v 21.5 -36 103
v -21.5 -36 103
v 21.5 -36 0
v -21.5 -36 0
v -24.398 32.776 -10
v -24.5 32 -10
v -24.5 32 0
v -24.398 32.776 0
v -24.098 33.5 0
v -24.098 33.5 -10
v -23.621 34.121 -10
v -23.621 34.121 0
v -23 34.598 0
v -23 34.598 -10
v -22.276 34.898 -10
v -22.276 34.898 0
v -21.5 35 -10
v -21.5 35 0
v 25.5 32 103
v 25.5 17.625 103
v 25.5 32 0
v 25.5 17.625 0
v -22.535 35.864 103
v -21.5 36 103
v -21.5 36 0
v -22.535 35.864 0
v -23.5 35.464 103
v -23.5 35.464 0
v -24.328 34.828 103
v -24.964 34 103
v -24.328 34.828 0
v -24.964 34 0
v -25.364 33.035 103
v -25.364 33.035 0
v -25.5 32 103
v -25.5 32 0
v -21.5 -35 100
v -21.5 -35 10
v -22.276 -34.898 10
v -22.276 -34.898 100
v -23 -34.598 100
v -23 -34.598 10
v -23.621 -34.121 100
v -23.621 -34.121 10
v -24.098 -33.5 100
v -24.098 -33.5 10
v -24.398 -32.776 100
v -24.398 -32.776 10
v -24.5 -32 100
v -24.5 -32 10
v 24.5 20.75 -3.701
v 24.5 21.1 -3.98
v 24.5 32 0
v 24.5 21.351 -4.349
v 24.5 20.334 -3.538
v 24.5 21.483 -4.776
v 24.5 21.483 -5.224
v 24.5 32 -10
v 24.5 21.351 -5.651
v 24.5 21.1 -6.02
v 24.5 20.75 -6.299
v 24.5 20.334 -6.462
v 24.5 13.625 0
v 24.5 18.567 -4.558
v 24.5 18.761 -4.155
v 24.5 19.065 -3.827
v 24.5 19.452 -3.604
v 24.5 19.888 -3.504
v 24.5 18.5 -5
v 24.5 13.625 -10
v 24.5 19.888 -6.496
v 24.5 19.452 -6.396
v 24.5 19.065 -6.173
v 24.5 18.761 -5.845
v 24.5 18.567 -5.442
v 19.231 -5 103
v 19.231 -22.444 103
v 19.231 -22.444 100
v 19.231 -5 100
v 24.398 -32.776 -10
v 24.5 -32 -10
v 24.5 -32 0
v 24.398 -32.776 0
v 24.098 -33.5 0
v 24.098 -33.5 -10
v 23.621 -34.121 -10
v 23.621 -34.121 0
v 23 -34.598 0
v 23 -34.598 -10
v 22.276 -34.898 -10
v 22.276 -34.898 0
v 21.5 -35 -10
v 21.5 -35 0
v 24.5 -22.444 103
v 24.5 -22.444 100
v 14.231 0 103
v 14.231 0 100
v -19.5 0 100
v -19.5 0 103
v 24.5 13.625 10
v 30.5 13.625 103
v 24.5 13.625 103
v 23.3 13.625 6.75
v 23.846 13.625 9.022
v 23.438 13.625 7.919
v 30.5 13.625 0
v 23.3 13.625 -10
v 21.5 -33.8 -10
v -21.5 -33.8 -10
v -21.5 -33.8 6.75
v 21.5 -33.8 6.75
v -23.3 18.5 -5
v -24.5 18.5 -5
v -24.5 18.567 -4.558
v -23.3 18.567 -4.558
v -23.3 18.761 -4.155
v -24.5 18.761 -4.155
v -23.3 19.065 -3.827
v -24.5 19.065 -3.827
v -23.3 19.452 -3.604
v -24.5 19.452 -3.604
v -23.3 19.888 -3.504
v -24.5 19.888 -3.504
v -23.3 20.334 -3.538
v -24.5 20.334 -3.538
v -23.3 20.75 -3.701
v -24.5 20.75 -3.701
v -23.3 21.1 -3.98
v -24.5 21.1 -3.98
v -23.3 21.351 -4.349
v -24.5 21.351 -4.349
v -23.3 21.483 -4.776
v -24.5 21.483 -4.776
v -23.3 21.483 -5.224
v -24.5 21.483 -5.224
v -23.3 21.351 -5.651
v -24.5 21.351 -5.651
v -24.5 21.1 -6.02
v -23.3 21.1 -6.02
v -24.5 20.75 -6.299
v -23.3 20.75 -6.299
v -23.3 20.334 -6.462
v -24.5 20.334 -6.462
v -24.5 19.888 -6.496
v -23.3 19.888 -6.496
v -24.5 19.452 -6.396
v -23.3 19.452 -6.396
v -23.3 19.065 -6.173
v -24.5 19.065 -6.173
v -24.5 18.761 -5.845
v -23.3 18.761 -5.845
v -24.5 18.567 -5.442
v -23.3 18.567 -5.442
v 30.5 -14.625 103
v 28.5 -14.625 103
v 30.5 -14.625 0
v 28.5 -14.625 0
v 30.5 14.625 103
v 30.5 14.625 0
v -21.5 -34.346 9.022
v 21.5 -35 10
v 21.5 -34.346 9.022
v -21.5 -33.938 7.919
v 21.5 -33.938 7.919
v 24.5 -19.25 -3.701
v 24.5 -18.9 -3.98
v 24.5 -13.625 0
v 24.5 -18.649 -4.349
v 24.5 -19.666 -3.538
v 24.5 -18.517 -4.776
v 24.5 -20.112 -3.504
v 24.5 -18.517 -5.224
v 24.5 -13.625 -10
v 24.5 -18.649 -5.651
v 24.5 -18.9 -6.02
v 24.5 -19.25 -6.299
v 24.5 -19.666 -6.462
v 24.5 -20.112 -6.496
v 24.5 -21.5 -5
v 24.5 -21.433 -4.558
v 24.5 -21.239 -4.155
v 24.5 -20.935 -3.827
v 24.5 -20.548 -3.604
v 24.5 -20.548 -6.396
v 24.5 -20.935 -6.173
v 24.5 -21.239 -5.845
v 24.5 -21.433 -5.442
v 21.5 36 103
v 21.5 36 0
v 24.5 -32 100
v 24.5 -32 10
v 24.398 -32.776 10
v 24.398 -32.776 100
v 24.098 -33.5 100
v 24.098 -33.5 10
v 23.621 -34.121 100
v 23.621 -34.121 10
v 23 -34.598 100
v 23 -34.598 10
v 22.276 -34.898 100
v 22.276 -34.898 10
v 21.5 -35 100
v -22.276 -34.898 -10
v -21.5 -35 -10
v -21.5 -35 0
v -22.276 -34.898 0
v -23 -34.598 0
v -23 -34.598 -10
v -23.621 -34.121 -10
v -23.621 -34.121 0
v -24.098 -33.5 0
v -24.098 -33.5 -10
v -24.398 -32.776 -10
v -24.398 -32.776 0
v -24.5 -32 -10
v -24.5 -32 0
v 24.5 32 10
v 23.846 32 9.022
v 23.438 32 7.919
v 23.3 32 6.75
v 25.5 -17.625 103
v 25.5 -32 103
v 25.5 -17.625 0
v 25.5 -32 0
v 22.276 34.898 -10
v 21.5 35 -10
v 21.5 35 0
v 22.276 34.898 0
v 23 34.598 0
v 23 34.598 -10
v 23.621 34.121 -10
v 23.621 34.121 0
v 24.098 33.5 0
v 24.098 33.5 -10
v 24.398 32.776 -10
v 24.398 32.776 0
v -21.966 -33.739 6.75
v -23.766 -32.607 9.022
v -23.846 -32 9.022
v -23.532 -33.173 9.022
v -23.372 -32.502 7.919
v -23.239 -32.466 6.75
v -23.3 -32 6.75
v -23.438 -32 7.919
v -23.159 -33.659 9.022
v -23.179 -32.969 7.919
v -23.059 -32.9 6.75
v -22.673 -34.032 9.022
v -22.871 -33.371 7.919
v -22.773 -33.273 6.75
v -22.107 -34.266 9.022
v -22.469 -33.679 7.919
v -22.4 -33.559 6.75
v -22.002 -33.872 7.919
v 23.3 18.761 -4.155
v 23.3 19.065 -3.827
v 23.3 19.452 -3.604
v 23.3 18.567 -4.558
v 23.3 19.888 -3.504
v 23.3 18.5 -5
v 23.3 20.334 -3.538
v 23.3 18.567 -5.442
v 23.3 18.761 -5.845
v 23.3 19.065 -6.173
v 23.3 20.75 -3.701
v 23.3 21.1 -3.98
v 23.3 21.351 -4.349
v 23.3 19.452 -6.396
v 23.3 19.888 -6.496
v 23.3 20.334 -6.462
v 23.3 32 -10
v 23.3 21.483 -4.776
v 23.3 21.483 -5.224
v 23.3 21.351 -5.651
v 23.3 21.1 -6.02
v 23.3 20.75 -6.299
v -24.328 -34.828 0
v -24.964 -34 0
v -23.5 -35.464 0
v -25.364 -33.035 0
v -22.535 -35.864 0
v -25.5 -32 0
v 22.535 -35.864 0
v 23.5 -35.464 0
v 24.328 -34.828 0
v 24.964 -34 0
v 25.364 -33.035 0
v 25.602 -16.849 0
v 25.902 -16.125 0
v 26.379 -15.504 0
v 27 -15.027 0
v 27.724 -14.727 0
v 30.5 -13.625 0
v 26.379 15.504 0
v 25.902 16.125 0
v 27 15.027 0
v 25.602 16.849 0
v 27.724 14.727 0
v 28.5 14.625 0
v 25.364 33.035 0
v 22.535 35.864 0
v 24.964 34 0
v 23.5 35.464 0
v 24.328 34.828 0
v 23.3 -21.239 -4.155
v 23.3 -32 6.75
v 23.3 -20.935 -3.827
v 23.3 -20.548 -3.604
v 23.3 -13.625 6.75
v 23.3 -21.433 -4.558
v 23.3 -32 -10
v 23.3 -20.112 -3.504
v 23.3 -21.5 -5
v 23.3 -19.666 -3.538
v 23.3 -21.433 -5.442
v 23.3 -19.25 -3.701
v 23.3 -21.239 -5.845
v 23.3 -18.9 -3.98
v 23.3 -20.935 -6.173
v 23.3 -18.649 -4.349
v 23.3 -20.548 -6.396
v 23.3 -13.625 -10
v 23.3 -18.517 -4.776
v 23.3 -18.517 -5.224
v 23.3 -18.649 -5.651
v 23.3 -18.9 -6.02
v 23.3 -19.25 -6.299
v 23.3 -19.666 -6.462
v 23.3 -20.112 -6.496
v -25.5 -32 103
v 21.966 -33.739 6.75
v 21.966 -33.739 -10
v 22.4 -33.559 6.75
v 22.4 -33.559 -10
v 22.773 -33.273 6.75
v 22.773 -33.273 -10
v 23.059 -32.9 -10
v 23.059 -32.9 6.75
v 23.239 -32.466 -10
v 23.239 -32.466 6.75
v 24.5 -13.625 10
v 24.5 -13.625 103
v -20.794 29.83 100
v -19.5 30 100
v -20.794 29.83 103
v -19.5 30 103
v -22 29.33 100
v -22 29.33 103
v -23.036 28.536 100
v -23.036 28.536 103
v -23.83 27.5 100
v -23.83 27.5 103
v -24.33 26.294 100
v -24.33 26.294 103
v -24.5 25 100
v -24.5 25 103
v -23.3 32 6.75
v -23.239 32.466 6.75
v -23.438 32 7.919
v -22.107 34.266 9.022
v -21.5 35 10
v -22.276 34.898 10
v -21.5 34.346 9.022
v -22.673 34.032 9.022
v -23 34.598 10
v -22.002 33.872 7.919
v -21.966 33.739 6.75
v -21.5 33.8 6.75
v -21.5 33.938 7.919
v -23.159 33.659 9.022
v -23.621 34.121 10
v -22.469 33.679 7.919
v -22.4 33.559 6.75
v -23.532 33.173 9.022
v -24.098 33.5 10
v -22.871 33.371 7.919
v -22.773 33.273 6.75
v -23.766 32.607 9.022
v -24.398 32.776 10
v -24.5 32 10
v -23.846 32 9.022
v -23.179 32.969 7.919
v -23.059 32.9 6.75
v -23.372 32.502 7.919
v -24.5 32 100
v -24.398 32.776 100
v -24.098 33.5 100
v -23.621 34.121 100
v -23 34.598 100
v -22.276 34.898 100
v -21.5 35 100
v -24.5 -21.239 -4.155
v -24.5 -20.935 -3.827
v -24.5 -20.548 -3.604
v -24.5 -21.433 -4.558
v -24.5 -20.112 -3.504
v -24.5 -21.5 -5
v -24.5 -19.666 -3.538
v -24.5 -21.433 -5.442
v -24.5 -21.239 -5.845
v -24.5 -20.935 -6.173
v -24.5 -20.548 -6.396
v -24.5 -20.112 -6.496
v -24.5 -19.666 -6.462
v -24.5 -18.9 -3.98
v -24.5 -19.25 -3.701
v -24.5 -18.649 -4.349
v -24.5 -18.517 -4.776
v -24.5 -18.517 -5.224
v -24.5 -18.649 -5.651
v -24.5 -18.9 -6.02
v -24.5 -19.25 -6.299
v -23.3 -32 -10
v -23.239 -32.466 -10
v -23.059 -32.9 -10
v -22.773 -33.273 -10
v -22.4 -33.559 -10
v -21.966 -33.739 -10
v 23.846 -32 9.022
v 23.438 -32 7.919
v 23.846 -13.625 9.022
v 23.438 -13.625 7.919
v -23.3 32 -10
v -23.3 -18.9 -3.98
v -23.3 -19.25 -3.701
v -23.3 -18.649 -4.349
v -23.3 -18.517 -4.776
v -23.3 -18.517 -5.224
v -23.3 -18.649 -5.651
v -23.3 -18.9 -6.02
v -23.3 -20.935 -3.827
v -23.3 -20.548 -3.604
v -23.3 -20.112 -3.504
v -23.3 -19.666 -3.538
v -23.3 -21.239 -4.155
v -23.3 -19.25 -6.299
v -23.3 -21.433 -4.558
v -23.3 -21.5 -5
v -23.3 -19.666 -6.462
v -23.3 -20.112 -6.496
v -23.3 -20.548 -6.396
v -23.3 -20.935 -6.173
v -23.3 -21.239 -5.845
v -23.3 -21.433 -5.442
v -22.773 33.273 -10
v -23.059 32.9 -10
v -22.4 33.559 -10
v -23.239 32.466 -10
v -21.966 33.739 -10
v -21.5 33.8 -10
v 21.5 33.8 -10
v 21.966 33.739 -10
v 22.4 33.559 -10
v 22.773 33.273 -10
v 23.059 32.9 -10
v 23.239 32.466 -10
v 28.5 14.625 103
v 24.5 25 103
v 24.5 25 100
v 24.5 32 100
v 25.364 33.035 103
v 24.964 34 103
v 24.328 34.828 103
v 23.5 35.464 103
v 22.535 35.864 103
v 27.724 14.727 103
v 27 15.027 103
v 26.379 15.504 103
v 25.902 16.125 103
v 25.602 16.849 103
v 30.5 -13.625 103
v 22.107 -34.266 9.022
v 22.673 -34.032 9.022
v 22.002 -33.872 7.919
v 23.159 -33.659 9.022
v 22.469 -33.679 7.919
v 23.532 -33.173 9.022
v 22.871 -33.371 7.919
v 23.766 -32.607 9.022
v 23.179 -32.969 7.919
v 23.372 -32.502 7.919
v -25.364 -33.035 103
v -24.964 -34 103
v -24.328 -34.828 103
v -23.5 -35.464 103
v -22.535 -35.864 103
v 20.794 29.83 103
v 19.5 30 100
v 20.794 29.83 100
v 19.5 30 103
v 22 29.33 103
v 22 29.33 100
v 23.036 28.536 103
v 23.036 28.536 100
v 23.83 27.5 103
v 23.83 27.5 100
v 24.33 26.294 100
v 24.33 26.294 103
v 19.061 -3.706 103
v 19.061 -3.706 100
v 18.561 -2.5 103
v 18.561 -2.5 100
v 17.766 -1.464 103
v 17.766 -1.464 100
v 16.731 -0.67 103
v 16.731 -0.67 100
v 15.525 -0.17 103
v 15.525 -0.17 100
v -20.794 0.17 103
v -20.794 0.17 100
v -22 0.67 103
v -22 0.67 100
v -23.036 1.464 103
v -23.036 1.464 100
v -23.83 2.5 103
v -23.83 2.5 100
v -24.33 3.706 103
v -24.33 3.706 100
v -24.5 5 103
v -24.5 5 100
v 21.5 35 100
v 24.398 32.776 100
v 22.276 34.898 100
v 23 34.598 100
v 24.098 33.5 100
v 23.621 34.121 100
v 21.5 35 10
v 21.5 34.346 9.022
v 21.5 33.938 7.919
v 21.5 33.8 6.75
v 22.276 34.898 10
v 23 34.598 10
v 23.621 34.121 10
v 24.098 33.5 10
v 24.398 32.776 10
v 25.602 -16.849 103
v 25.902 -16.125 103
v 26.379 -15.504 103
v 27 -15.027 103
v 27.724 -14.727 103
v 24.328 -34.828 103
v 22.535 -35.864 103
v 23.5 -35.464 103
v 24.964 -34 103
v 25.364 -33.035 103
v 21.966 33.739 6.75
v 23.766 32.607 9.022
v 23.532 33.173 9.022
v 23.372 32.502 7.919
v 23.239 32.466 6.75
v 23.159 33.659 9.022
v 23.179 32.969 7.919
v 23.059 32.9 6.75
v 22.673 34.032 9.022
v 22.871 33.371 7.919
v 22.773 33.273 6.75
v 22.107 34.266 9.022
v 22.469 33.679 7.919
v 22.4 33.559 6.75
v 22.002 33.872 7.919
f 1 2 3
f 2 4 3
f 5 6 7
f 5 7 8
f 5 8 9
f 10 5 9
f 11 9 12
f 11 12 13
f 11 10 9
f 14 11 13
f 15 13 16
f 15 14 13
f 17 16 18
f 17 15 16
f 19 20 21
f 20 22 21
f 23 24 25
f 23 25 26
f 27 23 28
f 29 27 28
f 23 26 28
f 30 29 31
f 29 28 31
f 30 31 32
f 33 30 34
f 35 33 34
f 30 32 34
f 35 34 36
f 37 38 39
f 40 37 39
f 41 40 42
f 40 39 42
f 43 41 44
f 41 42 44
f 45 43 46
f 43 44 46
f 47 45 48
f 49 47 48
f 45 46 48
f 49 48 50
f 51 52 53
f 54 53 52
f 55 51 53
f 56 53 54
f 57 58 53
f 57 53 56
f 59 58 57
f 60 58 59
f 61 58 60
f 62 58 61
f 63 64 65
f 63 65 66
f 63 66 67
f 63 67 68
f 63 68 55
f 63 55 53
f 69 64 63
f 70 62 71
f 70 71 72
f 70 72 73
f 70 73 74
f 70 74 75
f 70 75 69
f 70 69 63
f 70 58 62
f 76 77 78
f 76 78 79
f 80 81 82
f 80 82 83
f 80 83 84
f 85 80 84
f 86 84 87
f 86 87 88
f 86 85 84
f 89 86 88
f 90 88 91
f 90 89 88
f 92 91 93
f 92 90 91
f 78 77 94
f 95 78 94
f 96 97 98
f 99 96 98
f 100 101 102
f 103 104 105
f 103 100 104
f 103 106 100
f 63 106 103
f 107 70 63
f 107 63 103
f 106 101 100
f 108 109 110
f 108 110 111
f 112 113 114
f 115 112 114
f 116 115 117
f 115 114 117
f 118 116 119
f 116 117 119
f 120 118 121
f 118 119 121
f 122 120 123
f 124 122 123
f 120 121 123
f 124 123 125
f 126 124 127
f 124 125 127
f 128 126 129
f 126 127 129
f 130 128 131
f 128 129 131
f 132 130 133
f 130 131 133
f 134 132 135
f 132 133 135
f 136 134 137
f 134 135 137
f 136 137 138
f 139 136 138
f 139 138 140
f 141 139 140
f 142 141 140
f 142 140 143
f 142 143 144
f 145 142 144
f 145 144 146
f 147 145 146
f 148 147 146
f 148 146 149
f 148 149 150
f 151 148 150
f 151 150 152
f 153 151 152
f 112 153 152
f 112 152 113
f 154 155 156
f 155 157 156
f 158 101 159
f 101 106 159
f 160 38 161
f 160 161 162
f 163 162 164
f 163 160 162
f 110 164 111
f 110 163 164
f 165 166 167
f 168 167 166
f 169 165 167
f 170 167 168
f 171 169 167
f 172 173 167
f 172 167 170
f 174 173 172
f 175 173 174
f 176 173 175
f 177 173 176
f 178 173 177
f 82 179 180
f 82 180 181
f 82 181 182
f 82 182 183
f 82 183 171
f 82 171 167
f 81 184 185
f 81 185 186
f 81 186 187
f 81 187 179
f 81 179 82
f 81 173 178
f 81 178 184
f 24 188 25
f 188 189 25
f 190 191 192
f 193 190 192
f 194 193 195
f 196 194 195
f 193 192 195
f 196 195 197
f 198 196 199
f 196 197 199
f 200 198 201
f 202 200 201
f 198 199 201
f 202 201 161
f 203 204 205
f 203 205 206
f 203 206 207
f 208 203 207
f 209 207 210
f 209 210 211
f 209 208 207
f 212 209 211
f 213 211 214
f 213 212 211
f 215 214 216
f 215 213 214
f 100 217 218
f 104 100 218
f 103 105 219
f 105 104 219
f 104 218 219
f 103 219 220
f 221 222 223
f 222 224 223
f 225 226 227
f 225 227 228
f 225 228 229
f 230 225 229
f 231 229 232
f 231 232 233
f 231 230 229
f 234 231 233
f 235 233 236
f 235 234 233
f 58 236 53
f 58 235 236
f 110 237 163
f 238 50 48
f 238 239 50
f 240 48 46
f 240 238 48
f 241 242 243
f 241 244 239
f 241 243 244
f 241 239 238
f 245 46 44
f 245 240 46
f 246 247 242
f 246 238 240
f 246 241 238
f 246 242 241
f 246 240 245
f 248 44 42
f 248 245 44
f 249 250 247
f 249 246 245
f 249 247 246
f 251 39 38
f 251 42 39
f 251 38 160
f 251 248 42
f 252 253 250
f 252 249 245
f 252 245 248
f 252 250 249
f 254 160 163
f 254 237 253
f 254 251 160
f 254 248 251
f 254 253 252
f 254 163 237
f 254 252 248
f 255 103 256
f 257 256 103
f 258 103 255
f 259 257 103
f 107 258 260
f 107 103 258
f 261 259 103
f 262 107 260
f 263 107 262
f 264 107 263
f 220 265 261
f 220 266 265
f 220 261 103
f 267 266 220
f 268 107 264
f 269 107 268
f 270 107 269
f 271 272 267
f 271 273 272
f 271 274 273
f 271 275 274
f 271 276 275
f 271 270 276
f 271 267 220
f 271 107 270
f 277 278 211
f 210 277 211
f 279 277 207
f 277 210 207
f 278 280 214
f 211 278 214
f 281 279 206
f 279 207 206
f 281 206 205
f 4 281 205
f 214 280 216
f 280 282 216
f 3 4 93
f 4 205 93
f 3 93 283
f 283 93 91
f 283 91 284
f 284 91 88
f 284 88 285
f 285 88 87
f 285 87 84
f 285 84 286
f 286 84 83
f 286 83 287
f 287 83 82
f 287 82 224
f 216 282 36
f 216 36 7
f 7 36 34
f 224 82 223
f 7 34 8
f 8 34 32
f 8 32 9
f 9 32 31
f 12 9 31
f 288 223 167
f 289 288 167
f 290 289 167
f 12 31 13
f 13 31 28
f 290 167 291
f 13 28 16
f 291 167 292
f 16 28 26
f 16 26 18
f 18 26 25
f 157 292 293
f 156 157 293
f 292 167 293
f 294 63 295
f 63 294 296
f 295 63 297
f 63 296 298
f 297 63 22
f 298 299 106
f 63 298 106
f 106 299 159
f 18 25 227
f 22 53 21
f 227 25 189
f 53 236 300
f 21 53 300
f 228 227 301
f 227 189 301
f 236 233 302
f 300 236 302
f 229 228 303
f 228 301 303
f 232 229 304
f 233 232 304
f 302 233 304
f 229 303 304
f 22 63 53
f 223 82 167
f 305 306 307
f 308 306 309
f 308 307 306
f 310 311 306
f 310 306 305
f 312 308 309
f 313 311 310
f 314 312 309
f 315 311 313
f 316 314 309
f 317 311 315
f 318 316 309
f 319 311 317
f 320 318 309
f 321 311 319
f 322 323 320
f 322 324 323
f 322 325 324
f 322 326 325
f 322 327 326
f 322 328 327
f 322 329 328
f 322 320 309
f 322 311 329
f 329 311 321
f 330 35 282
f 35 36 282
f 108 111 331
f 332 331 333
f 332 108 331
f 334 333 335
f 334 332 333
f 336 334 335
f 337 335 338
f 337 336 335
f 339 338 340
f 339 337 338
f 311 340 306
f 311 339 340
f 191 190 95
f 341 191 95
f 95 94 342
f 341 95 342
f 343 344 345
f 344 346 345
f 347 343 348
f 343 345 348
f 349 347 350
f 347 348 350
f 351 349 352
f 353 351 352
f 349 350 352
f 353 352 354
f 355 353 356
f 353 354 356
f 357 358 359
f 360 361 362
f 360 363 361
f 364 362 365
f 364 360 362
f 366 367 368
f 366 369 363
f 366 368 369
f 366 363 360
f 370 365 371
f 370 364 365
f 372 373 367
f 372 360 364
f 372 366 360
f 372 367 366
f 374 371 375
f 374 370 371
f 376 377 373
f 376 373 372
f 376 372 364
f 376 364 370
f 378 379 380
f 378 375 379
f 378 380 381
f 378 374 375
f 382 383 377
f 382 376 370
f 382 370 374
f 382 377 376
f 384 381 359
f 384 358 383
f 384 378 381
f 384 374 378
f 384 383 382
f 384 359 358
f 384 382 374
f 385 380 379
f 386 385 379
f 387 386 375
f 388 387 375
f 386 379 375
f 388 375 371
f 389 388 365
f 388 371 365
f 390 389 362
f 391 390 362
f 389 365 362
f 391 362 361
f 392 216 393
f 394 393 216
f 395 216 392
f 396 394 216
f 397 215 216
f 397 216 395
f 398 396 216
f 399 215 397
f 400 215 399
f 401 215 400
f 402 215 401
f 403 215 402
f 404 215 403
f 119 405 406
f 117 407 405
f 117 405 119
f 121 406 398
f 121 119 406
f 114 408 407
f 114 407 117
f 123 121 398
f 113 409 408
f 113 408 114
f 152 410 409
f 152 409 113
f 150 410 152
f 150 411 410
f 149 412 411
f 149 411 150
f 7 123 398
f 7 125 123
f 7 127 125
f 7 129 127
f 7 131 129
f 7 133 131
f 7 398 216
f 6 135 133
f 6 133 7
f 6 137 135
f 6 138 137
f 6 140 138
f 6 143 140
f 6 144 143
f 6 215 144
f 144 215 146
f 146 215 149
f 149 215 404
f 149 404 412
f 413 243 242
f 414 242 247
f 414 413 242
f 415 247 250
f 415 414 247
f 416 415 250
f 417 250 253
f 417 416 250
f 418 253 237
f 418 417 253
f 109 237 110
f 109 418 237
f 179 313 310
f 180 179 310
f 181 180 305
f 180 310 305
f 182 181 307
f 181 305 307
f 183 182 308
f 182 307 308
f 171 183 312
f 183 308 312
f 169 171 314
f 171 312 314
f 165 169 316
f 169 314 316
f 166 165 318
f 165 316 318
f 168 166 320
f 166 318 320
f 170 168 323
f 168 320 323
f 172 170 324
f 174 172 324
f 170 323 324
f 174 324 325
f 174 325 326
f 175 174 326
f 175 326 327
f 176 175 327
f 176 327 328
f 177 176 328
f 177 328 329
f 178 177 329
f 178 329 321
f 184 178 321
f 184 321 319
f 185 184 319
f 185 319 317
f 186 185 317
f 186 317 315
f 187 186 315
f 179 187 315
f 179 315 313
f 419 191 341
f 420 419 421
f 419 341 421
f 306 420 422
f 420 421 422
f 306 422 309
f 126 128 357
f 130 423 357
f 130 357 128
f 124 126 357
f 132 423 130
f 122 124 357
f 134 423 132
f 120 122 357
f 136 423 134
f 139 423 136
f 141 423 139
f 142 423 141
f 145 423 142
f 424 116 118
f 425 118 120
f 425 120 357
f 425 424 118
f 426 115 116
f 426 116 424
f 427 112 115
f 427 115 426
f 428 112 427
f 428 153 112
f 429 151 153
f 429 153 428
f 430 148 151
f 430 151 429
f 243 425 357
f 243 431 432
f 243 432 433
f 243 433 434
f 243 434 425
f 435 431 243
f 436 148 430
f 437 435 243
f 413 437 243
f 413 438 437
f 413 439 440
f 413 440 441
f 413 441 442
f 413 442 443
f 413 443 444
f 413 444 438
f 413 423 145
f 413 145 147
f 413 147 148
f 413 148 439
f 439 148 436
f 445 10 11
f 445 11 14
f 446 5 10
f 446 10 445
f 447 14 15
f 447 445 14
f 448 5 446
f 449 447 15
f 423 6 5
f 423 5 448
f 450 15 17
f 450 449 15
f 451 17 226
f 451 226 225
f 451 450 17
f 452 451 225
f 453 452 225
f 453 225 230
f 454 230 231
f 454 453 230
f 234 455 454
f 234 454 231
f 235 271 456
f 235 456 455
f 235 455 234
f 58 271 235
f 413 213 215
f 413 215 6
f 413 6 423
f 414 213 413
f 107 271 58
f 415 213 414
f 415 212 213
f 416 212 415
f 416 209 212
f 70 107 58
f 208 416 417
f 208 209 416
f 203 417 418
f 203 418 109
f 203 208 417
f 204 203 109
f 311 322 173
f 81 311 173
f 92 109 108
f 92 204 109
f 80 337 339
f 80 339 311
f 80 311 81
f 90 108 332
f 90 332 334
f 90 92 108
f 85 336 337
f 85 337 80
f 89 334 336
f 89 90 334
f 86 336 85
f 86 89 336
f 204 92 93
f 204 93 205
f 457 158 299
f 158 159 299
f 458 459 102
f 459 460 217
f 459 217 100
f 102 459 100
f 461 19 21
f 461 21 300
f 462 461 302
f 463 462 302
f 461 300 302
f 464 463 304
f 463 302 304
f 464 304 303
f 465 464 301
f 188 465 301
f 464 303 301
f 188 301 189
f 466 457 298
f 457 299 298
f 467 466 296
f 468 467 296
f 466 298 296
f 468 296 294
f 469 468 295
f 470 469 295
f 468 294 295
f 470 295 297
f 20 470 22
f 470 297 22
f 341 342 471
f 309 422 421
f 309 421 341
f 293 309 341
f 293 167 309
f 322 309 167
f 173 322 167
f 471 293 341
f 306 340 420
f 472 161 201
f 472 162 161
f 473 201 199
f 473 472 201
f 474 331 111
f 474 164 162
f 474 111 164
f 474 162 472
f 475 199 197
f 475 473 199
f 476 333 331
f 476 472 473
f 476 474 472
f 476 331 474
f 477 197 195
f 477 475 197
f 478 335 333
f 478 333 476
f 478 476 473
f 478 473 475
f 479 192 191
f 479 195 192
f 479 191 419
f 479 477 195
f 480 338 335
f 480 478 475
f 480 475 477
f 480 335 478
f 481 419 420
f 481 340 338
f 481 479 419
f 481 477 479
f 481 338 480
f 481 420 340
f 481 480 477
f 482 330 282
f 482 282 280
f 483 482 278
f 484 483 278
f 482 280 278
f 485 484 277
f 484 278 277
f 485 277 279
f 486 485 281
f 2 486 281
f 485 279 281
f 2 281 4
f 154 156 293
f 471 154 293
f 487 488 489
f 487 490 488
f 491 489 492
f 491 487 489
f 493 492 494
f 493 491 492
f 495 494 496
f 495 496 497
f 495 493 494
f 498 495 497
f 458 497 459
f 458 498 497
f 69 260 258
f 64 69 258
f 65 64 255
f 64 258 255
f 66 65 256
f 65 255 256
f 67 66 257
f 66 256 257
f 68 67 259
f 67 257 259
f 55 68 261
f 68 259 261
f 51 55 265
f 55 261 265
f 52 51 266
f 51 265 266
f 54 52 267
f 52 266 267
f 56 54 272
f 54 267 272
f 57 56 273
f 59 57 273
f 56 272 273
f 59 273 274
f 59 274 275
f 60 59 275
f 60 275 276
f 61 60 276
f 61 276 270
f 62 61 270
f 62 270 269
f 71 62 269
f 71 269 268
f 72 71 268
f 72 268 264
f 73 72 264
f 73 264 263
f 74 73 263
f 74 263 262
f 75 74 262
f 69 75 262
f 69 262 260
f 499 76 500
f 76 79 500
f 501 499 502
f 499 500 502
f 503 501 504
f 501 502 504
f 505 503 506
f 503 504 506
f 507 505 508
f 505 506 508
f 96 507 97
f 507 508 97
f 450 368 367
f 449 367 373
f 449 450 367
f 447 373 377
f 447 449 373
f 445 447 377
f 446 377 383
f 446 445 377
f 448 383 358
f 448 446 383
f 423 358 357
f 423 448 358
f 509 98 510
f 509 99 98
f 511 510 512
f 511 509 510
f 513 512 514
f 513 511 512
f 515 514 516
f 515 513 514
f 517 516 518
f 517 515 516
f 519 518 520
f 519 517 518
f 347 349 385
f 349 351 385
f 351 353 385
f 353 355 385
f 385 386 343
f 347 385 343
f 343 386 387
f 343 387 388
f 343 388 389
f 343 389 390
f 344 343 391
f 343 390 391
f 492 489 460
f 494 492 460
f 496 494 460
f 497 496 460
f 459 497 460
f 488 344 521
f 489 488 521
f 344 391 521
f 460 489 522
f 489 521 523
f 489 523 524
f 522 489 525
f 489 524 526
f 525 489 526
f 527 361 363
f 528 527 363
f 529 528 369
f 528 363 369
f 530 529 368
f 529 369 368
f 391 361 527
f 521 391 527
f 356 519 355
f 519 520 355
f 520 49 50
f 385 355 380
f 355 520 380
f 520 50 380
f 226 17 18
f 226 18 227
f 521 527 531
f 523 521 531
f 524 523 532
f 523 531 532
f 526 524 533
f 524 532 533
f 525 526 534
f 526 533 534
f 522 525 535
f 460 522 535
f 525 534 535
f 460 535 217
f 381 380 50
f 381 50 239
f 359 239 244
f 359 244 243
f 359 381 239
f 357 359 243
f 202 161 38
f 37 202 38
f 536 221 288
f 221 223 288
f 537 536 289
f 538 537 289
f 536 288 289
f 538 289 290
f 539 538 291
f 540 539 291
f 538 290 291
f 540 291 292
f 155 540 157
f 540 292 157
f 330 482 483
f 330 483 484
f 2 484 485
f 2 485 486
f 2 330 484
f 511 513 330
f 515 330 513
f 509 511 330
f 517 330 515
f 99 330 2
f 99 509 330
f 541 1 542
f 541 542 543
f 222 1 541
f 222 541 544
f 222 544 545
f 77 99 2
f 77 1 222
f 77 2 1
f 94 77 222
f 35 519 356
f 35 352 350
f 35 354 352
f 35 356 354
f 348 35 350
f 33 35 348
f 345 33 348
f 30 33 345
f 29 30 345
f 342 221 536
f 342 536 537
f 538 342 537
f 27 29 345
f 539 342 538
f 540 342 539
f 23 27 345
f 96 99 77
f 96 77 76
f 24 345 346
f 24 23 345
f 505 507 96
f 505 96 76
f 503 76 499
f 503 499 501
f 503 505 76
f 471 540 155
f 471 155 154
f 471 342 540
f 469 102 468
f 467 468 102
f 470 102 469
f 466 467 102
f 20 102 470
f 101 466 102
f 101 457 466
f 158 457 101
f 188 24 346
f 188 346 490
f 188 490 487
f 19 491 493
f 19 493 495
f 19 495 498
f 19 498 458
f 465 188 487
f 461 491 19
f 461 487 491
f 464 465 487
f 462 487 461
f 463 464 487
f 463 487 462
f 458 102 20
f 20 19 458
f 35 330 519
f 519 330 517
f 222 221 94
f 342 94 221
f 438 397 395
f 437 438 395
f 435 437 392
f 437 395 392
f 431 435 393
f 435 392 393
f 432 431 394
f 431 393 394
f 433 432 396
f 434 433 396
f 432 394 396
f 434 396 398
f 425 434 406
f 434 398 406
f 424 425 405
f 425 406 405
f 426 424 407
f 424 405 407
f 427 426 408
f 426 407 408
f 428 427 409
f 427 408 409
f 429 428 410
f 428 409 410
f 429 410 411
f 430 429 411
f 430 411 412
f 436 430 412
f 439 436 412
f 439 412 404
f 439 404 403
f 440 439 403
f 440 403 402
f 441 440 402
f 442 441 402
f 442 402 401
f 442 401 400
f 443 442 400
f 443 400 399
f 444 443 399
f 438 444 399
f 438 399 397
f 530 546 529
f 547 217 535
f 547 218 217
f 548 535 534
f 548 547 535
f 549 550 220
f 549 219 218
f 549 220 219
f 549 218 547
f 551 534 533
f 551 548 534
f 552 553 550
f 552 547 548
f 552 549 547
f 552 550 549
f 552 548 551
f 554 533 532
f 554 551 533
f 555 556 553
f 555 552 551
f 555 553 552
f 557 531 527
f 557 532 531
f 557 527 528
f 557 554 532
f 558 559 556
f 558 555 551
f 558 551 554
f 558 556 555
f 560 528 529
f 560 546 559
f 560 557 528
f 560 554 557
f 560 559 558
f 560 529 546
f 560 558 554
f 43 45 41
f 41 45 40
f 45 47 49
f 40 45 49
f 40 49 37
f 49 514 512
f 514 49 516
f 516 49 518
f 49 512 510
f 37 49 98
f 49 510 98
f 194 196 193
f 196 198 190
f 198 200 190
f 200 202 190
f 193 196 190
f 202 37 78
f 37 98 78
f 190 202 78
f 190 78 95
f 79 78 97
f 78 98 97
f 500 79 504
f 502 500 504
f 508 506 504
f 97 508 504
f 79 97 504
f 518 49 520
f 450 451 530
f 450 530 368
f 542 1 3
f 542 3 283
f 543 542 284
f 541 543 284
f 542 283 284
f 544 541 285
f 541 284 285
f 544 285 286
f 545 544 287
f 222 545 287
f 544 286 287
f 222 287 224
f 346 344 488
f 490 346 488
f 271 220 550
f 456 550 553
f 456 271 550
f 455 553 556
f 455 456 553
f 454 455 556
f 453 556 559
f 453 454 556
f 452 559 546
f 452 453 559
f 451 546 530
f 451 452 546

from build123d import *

# Parameters (mm, degrees)
F1_DEPTH     = 100
F3_DEPTH     = 3
F5_DEPTH     = 10
F6_R         = 1.5
F7_DEPTH     = 55.001
F8_T1_DEPTH  = 26.4990384046
F8_T3_DEPTH  = 43
F8_T5_DEPTH  = 64
F8_T7_DEPTH  = 26.4990384046
F8_T10_ANGLE = 90
F8_T12_ANGLE = 90
F8_T14_ANGLE = 90
F8_T16_ANGLE = 90
F9_W         = 5.2690437883
F9_H         = 22.4438142031
F10_DEPTH    = 25
F11_DEPTH    = 22.3
F12_R        = 5


# Not quite as in the source:
# - a fillet or chamfer that OpenCascade refuses, or shapes differently, is made with other operations: its cross-section is extruded or revolved along the edge and cut away or added
# - two fillets or chamfers of one size are made in one step


with BuildPart() as f1:
    # F0 (on Top) → F1 (new body)
    with BuildSketch(Plane.XY):
        with BuildLine():
            Line((-21.5, 35), (21.5, 35))
            ThreePointArc((21.5, 35), (23.6213203436, 34.1213203436), (24.5, 32))
            Line((24.5, 32), (24.5, 13.625))
            Line((24.5, 13.625), (30.5, 13.625))
            Line((30.5, 13.625), (30.5, 14.625))
            Line((30.5, 14.625), (28.5, 14.625))
            ThreePointArc((28.5, 14.625), (26.3786796564, 15.5036796564), (25.5, 17.625))
            Line((25.5, 17.625), (25.5, 32))
            ThreePointArc((25.5, 32), (24.3284271247, 34.8284271247), (21.5, 36))
            Line((21.5, 36), (-21.5, 36))
            ThreePointArc((-21.5, 36), (-24.3284271247, 34.8284271247), (-25.5, 32))
            Line((-25.5, 32), (-25.5, -32))
            ThreePointArc((-25.5, -32), (-24.3284271247, -34.8284271247), (-21.5, -36))
            Line((-21.5, -36), (21.5, -36))
            ThreePointArc((21.5, -36), (24.3284271247, -34.8284271247), (25.5, -32))
            Line((25.5, -32), (25.5, -17.625))
            ThreePointArc((25.5, -17.625), (26.3786796564, -15.5036796564), (28.5, -14.625))
            Line((28.5, -14.625), (30.5, -14.625))
            Line((30.5, -14.625), (30.5, -13.625))
            Line((30.5, -13.625), (24.5, -13.625))
            Line((24.5, -13.625), (24.5, -32))
            ThreePointArc((24.5, -32), (23.6213203436, -34.1213203436), (21.5, -35))
            Line((21.5, -35), (-21.5, -35))
            ThreePointArc((-21.5, -35), (-23.6213203436, -34.1213203436), (-24.5, -32))
            Line((-24.5, -32), (-24.5, 32))
            ThreePointArc((-24.5, 32), (-23.6213203436, 34.1213203436), (-21.5, 35))
        make_face()
    extrude(amount=F1_DEPTH)

    # F2 (on face) → F3 (join)
    with BuildSketch(Plane.XY.offset(100)):
        with BuildLine():
            Line((24.5, -32), (24.5, -13.625))
            Line((24.5, -13.625), (24.5, 0))
            Line((24.5, 0), (-24.5, 0))
            Line((-24.5, 0), (-24.5, -32))
            ThreePointArc((-24.5, -32), (-23.6213203436, -34.1213203436), (-21.5, -35))
            Line((-21.5, -35), (21.5, -35))
            ThreePointArc((21.5, -35), (23.6213203436, -34.1213203436), (24.5, -32))
        make_face()
        with BuildLine():
            Line((30.5, -13.625), (24.5, -13.625))
            Line((24.5, -13.625), (24.5, -32))
            ThreePointArc((24.5, -32), (23.6213203436, -34.1213203436), (21.5, -35))
            Line((21.5, -35), (-21.5, -35))
            ThreePointArc((-21.5, -35), (-23.6213203436, -34.1213203436), (-24.5, -32))
            Line((-24.5, -32), (-24.5, 0))
            Line((-24.5, 0), (-24.5, 30))
            Line((-24.5, 30), (-24.5, 32))
            ThreePointArc((-24.5, 32), (-23.6213203436, 34.1213203436), (-21.5, 35))
            Line((-21.5, 35), (21.5, 35))
            ThreePointArc((21.5, 35), (23.6213203436, 34.1213203436), (24.5, 32))
            Line((24.5, 32), (24.5, 30))
            Line((24.5, 30), (24.5, 13.625))
            Line((24.5, 13.625), (30.5, 13.625))
            Line((30.5, 13.625), (30.5, 14.625))
            Line((30.5, 14.625), (28.5, 14.625))
            ThreePointArc((28.5, 14.625), (26.3786796564, 15.5036796564), (25.5, 17.625))
            Line((25.5, 17.625), (25.5, 32))
            ThreePointArc((25.5, 32), (24.3284271247, 34.8284271247), (21.5, 36))
            Line((21.5, 36), (-21.5, 36))
            ThreePointArc((-21.5, 36), (-24.3284271247, 34.8284271247), (-25.5, 32))
            Line((-25.5, 32), (-25.5, -32))
            ThreePointArc((-25.5, -32), (-24.3284271247, -34.8284271247), (-21.5, -36))
            Line((-21.5, -36), (21.5, -36))
            ThreePointArc((21.5, -36), (24.3284271247, -34.8284271247), (25.5, -32))
            Line((25.5, -32), (25.5, -17.625))
            ThreePointArc((25.5, -17.625), (26.3786796564, -15.5036796564), (28.5, -14.625))
            Line((28.5, -14.625), (30.5, -14.625))
            Line((30.5, -14.625), (30.5, -13.625))
        make_face()
        with BuildLine():
            Line((-24.5, 32), (-24.5, 30))
            Line((-24.5, 30), (24.5, 30))
            Line((24.5, 30), (24.5, 32))
            ThreePointArc((24.5, 32), (23.6213203436, 34.1213203436), (21.5, 35))
            Line((21.5, 35), (-21.5, 35))
            ThreePointArc((-21.5, 35), (-23.6213203436, 34.1213203436), (-24.5, 32))
        make_face()
    extrude(amount=F3_DEPTH)

    # F4 (on face) → F5 (join, symmetric)
    with BuildSketch(Plane(origin=(0, 0, 0), x_dir=(1, 0, 0), z_dir=(0, 0, -1))):
        with BuildLine():
            Line((23.3, -13.625), (23.3, -32))
            ThreePointArc((23.3, -32), (22.7727922061, -33.2727922061), (21.5, -33.8))
            Line((21.5, -33.8), (-21.5, -33.8))
            ThreePointArc((-21.5, -33.8), (-22.7727922061, -33.2727922061), (-23.3, -32))
            Line((-23.3, -32), (-23.3, 32))
            ThreePointArc((-23.3, 32), (-22.7727922061, 33.2727922061), (-21.5, 33.8))
            Line((-21.5, 33.8), (21.5, 33.8))
            ThreePointArc((21.5, 33.8), (22.7727922061, 33.2727922061), (23.3, 32))
            Line((23.3, 32), (23.3, 13.625))
            Line((23.3, 13.625), (24.5, 13.625))
            Line((24.5, 13.625), (24.5, 32))
            ThreePointArc((24.5, 32), (23.6213203436, 34.1213203436), (21.5, 35))
            Line((21.5, 35), (-21.5, 35))
            ThreePointArc((-21.5, 35), (-23.6213203436, 34.1213203436), (-24.5, 32))
            Line((-24.5, 32), (-24.5, -32))
            ThreePointArc((-24.5, -32), (-23.6213203436, -34.1213203436), (-21.5, -35))
            Line((-21.5, -35), (21.5, -35))
            ThreePointArc((21.5, -35), (23.6213203436, -34.1213203436), (24.5, -32))
            Line((24.5, -32), (24.5, -13.625))
            Line((24.5, -13.625), (23.3, -13.625))
        make_face()
    extrude(amount=F5_DEPTH, both=True)

    # F6 (on face) → F7 (cut, through all)
    with BuildSketch(Plane(origin=(-24.5, 0, 0), x_dir=(0, -1, 0), z_dir=(-1, 0, 0))):
        with Locations((-20, -5)):
            Circle(F6_R)
        with Locations((20, -5)):
            Circle(F6_R)
    extrude(amount=-F7_DEPTH, mode=Mode.SUBTRACT)

    # F8: fillet of radius 5 on 1 edges, made by hand

    # F8_s2 → F8_t1 (cut)
    with BuildSketch(Plane.XZ.offset(-32)):
        with BuildLine():
            ThreePointArc((24.5, 10), (23.6095842402, 8.4824354457), (23.3, 6.7503846381))
            Line((23.3, 6.7503846381), (23.3, 10))
            Line((23.3, 10), (24.5, 10))
        make_face()
    extrude(amount=F8_T1_DEPTH, mode=Mode.SUBTRACT)

    # F8_s4 → F8_t3 (cut)
    with BuildSketch(Plane.YZ.offset(-21.5)):
        with BuildLine():
            ThreePointArc((35, 10), (34.1095842402, 8.4824354457), (33.8, 6.7503846381))
            Line((33.8, 6.7503846381), (33.8, 10))
            Line((33.8, 10), (35, 10))
        make_face()
        with BuildLine():
            ThreePointArc((-35, 10), (-34.1095842402, 8.4824354457), (-33.8, 6.7503846381))
            Line((-33.8, 6.7503846381), (-33.8, 10))
            Line((-33.8, 10), (-35, 10))
        make_face()
    extrude(amount=F8_T3_DEPTH, mode=Mode.SUBTRACT)

    # F8_s6 → F8_t5 (cut)
    with BuildSketch(Plane.XZ.offset(-32)):
        with BuildLine():
            ThreePointArc((-24.5, 10), (-23.6095842402, 8.4824354457), (-23.3, 6.7503846381))
            Line((-23.3, 6.7503846381), (-23.3, 10))
            Line((-23.3, 10), (-24.5, 10))
        make_face()
    extrude(amount=F8_T5_DEPTH, mode=Mode.SUBTRACT)

    # F8_s8 → F8_t7 (cut)
    with BuildSketch(Plane.XZ.offset(5.5009615954)):
        with BuildLine():
            ThreePointArc((24.5, 10), (23.6095842402, 8.4824354457), (23.3, 6.7503846381))
            Line((23.3, 6.7503846381), (23.3, 10))
            Line((23.3, 10), (24.5, 10))
        make_face()
    extrude(amount=F8_T7_DEPTH, mode=Mode.SUBTRACT)

    # F8_s9 → F8_t10 (revolve, cut)
    with BuildSketch(Plane.XZ.offset(-32)):
        with BuildLine():
            ThreePointArc((24.5, 10), (23.6095842402, 8.4824354457), (23.3, 6.7503846381))
            Line((23.3, 6.7503846381), (23.3, 10))
            Line((23.3, 10), (24.5, 10))
        make_face()
    revolve(axis=Axis((21.5, 32, 10), (0, 0, 1)), revolution_arc=F8_T10_ANGLE, mode=Mode.SUBTRACT)

    # F8_s11 → F8_t12 (revolve, cut)
    with BuildSketch(Plane.YZ.offset(-21.5)):
        with BuildLine():
            ThreePointArc((35, 10), (34.1095842402, 8.4824354457), (33.8, 6.7503846381))
            Line((33.8, 6.7503846381), (33.8, 10))
            Line((33.8, 10), (35, 10))
        make_face()
    revolve(axis=Axis((-21.5, 32, 10), (0, 0, 1)), revolution_arc=F8_T12_ANGLE, mode=Mode.SUBTRACT)

    # F8_s13 → F8_t14 (revolve, cut)
    with BuildSketch(Plane.XZ.offset(32)):
        with BuildLine():
            ThreePointArc((-24.5, 10), (-23.6095842402, 8.4824354457), (-23.3, 6.7503846381))
            Line((-23.3, 6.7503846381), (-23.3, 10))
            Line((-23.3, 10), (-24.5, 10))
        make_face()
    revolve(axis=Axis((-21.5, -32, 10), (0, 0, 1)), revolution_arc=F8_T14_ANGLE, mode=Mode.SUBTRACT)

    # F8_s15 → F8_t16 (revolve, cut)
    with BuildSketch(Plane.YZ.offset(21.5)):
        with BuildLine():
            ThreePointArc((-35, 10), (-34.1095842402, 8.4824354457), (-33.8, 6.7503846381))
            Line((-33.8, 6.7503846381), (-33.8, 10))
            Line((-33.8, 10), (-35, 10))
        make_face()
    revolve(axis=Axis((21.5, -32, 10), (0, 0, 1)), revolution_arc=F8_T16_ANGLE, mode=Mode.SUBTRACT)

    # F9 (on face) → F10 (cut)
    with BuildSketch(Plane.XY.offset(103)):
        with Locations((21.8654781058, -11.2219071016)):
            Rectangle(F9_W, F9_H)
    extrude(amount=-F10_DEPTH, mode=Mode.SUBTRACT)

    # F9 (on face) → F11 (cut)
    with BuildSketch(Plane.XY.offset(103)):
        Polygon((24.5, -13.625), (24.5, 0), (19.2309562117, 0), (19.2309562117, -22.4438142031), (24.5, -22.4438142031), align=None)
    extrude(amount=-F11_DEPTH, mode=Mode.SUBTRACT)

    # F12
    f12_edges = [f1.edges().sort_by_distance(p)[0] for p in [
        (-24.5, 0, 101.5),
        (19.230956, 0, 101.5),
        (-24.5, 30, 101.5),
        (24.5, 30, 101.5),
    ]]
    fillet(f12_edges, radius=F12_R)


solid = f1.part
